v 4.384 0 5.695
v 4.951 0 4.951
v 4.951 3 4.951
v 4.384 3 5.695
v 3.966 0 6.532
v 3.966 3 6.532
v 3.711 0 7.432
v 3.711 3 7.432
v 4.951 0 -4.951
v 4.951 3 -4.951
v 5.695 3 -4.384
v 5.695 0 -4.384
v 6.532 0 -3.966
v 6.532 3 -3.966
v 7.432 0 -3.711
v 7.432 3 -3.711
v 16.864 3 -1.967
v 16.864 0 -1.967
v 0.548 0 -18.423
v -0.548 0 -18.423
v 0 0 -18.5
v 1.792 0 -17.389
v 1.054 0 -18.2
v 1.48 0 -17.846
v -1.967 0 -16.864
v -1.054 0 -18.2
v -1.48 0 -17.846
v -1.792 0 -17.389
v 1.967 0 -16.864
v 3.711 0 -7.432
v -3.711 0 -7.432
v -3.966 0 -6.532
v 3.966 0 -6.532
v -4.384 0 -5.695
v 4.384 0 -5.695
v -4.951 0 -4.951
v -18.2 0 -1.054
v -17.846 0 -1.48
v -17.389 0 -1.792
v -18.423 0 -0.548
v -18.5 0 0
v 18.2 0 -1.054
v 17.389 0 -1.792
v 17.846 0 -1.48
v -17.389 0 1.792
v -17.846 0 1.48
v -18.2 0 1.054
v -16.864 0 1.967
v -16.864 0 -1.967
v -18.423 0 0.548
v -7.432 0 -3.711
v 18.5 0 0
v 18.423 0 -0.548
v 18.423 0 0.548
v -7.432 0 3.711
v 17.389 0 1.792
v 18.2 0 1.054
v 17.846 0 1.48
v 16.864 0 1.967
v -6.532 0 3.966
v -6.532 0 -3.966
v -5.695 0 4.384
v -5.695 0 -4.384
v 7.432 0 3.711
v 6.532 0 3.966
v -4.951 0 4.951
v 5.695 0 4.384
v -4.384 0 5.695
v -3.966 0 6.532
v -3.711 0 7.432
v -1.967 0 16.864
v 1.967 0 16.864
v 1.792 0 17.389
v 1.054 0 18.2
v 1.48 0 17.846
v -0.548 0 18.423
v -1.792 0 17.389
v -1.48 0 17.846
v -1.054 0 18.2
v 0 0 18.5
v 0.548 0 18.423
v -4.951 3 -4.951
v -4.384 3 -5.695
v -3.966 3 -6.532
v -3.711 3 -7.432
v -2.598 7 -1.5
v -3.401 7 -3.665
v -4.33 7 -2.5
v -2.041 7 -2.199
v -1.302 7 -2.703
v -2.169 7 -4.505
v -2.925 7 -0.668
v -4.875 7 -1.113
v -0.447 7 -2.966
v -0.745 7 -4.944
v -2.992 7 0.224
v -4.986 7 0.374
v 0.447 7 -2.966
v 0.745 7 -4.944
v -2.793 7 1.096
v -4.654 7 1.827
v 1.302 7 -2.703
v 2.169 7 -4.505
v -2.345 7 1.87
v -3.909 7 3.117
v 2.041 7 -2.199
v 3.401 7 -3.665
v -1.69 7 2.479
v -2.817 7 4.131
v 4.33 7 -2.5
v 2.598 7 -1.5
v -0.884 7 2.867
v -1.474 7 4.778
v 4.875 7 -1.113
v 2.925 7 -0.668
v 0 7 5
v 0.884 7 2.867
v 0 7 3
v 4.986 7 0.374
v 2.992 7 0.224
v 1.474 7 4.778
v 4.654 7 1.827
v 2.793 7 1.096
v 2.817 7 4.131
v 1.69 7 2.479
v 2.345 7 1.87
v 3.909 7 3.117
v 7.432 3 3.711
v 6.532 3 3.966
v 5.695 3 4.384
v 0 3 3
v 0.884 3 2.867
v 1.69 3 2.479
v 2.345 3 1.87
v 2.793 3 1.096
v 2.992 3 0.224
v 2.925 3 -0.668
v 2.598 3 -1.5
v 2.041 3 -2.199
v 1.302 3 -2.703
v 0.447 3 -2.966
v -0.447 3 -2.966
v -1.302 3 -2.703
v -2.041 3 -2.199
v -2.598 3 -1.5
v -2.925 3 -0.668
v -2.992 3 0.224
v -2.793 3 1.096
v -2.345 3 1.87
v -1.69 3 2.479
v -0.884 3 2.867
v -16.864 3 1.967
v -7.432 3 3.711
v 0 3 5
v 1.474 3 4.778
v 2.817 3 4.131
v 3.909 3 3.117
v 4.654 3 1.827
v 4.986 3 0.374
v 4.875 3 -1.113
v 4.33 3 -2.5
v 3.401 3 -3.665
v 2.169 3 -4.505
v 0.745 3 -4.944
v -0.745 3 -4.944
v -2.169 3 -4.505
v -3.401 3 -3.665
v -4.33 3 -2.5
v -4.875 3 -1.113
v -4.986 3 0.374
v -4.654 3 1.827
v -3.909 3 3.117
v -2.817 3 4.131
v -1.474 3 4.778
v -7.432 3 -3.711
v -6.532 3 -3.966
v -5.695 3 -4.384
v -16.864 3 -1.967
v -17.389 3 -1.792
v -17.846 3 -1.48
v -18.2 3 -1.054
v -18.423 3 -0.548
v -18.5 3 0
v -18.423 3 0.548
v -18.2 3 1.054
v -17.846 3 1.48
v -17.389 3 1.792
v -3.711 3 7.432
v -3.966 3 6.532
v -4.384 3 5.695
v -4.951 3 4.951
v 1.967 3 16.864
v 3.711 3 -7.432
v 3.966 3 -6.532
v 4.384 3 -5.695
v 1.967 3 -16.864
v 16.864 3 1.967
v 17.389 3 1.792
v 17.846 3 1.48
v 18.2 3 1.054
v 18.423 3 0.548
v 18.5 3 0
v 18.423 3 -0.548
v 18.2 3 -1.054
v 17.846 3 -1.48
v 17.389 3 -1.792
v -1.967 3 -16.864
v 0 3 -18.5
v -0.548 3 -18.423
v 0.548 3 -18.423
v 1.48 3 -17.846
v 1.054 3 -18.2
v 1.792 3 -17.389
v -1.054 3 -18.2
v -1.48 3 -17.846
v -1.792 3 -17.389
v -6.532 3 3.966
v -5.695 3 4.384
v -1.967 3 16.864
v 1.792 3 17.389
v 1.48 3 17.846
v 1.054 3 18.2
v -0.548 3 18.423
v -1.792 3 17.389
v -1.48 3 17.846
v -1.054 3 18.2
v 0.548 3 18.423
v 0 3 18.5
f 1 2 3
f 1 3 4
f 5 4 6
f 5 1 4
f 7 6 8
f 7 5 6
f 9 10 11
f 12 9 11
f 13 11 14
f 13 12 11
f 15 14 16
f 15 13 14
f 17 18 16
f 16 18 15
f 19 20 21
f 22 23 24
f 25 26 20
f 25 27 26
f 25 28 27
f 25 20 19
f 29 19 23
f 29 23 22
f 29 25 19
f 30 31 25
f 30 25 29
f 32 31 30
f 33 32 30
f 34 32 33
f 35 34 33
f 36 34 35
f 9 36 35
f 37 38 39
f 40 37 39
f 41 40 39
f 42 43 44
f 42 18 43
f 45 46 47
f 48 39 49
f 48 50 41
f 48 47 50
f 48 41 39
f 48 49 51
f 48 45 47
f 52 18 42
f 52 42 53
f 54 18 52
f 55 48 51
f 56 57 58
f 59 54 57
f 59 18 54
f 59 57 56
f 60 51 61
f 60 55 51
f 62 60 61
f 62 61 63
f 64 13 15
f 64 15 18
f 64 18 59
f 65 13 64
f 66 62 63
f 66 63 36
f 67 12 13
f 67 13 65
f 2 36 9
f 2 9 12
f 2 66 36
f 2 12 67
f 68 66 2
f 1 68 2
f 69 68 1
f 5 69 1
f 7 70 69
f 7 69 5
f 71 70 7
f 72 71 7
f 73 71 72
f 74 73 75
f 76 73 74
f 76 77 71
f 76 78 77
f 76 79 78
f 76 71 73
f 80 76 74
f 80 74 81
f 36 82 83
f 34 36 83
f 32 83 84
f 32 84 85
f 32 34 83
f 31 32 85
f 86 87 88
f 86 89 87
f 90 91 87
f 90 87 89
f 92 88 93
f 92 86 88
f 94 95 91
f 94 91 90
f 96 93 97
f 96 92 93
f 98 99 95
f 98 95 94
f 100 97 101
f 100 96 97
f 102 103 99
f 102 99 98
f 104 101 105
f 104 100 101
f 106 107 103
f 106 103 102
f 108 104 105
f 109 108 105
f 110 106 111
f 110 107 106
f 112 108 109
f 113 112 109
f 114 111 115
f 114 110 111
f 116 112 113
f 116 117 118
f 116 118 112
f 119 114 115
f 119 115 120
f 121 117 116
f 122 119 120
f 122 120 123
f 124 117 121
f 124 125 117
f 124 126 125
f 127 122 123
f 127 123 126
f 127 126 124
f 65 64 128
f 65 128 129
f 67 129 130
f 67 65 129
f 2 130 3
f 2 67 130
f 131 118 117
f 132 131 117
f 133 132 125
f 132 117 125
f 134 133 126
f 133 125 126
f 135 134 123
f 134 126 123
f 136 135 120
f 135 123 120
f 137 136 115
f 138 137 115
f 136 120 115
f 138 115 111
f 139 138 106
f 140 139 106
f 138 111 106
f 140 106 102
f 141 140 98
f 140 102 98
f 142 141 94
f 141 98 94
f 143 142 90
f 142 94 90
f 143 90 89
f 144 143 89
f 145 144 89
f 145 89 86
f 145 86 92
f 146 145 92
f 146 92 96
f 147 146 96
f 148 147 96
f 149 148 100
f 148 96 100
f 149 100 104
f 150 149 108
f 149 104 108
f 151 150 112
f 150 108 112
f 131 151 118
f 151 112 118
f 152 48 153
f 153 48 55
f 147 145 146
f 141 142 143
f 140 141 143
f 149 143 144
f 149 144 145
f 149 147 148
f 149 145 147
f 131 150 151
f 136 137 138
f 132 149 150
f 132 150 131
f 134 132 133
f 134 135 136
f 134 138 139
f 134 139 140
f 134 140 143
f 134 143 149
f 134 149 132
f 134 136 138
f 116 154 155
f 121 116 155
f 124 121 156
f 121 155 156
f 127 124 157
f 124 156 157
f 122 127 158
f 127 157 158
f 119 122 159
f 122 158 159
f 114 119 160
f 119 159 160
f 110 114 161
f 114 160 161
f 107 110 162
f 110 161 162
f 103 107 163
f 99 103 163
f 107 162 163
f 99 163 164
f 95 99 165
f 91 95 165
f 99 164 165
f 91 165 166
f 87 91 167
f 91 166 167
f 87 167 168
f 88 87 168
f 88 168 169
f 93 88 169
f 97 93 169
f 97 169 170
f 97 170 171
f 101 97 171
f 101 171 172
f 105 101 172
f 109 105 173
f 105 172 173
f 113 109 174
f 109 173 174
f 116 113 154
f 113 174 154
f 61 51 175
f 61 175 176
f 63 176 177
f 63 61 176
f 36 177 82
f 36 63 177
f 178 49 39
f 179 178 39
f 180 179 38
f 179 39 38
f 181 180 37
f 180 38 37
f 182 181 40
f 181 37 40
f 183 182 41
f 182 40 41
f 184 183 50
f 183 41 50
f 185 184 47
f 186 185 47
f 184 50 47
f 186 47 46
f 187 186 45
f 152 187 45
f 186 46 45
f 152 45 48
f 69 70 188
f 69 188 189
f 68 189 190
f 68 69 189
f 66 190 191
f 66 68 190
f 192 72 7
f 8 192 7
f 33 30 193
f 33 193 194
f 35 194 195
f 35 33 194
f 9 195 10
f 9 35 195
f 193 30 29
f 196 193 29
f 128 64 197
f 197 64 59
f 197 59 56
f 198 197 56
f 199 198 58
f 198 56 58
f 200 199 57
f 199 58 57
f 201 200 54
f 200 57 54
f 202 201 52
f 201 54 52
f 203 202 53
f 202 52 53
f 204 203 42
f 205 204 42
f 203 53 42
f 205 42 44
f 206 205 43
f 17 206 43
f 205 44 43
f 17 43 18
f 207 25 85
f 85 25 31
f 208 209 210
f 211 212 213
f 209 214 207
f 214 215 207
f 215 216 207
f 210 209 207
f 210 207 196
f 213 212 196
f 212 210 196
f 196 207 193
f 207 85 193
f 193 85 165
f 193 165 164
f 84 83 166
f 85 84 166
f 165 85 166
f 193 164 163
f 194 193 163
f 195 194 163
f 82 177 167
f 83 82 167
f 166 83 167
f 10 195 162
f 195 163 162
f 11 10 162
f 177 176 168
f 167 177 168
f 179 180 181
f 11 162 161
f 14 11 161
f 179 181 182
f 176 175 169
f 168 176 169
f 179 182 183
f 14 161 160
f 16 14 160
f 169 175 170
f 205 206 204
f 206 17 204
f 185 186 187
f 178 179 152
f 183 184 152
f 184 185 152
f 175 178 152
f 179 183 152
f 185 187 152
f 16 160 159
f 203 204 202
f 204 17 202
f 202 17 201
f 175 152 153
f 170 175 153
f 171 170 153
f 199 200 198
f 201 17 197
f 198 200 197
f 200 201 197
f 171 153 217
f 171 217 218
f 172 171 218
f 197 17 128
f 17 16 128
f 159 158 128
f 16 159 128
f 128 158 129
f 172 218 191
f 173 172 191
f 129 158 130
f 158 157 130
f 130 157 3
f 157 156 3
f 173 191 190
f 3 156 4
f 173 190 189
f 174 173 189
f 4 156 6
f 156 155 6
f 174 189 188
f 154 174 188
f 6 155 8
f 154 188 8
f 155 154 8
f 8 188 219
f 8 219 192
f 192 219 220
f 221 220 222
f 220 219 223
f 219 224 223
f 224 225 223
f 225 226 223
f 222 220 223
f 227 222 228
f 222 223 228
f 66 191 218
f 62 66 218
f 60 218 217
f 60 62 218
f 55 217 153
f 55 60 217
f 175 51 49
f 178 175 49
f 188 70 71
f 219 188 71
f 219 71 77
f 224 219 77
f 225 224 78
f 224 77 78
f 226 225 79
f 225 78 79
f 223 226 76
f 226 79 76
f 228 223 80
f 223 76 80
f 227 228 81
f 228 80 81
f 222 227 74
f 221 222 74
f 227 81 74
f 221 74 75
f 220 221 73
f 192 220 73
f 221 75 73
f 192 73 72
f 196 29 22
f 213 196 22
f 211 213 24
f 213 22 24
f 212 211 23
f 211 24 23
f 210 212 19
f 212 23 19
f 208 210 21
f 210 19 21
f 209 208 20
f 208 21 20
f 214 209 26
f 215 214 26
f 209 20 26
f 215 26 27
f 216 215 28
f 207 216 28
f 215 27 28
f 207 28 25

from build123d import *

# Parameters (mm, degrees)
BOSS_EXTRUDE1_DEPTH = 3
SKETCH2_R           = 5
BOSS_EXTRUDE2_DEPTH = 4
SKETCH3_R           = 3
CUT_EXTRUDE1_DEPTH  = 4
FILLET1_R           = 5


with BuildPart() as part:
    # Sketch1 → Boss-Extrude1 (new body)
    with BuildSketch(Plane(origin=(0, 0, 0), x_dir=(1, 0, 0), z_dir=(0, 1, 0))):
        with BuildLine():
            Line((-1.966664332, 16.863636364), (-4.025937287, 5.726415018))
            ThreePointArc((-4.025937287, 5.726415018), (-4.949747468, 4.949747468), (-5.726415018, 4.025937287))
            Line((-5.726415018, 4.025937287), (-16.863636364, 1.966664332))
            ThreePointArc((-16.863636364, 1.966664332), (-18.5, 0), (-16.863636364, -1.966664332))
            Line((-16.863636364, -1.966664332), (-5.726415018, -4.025937287))
            ThreePointArc((-5.726415018, -4.025937287), (-4.949747468, -4.949747468), (-4.025937287, -5.726415018))
            Line((-4.025937287, -5.726415018), (-1.966664332, -16.863636364))
            ThreePointArc((-1.966664332, -16.863636364), (0, -18.5), (1.966664332, -16.863636364))
            Line((1.966664332, -16.863636364), (4.025937287, -5.726415018))
            ThreePointArc((4.025937287, -5.726415018), (4.949747468, -4.949747468), (5.726415018, -4.025937287))
            Line((5.726415018, -4.025937287), (16.863636364, -1.966664332))
            ThreePointArc((16.863636364, -1.966664332), (18.5, 0), (16.863636364, 1.966664332))
            Line((16.863636364, 1.966664332), (5.726415018, 4.025937287))
            ThreePointArc((5.726415018, 4.025937287), (4.949747468, 4.949747468), (4.025937287, 5.726415018))
            Line((4.025937287, 5.726415018), (1.966664332, 16.863636364))
            ThreePointArc((1.966664332, 16.863636364), (0, 18.5), (-1.966664332, 16.863636364))
        make_face()
    extrude(amount=BOSS_EXTRUDE1_DEPTH)

    # Sketch2 → Boss-Extrude2 (add)
    with BuildSketch(Plane(origin=(0, 3, 0), x_dir=(1, 0, 0), z_dir=(0, 1, 0))):
        with Locations(Location((0, 0, 0), (0, 0, 270))):
            Circle(SKETCH2_R)
    extrude(amount=BOSS_EXTRUDE2_DEPTH)

    # Sketch3 → Cut-Extrude1 (cut)
    with BuildSketch(Plane(origin=(0, 7, 0), x_dir=(1, 0, 0), z_dir=(0, 1, 0))):
        with Locations(Location((0, 0, 0), (0, 0, 270))):
            Circle(SKETCH3_R)
    extrude(amount=-CUT_EXTRUDE1_DEPTH, mode=Mode.SUBTRACT)

    # Fillet1
    # the kernel refuses this fillet: 5 mm, written as the material it adds along each edge
    with BuildSketch(Plane(origin=(5.726415018, 0, 4.025937287), x_dir=(0.983332166035634, 0, -0.18181818181817894), z_dir=(0, 1, 0))) as fillet1_piece_1:
        with BuildLine():
            CenterArc((1.734270095, -5), FILLET1_R, 90, 33.557309762)
            ThreePointArc((-1.029583897, -0.833333333), (-0.495036767, -0.441074207), (0, 0))
            Line((0, 0), (1.734270095, 0))
        make_face()
    extrude(amount=3)
    with BuildSketch(Plane(origin=(4.025937287, 0, 5.726415018), x_dir=(0.7599749646341246, 0, -0.6499523468142576), z_dir=(0, 1, 0))) as fillet1_piece_2:
        with BuildLine():
            CenterArc((1.797631616, -4.977571028), FILLET1_R, 95.428999418, 33.557309762)
            Line((-1.348041755, -1.091089451), (0, 0))
            ThreePointArc((0, 0), (0.662285332, -0.031400561), (1.324570664, 0))
        make_face()
    extrude(amount=3)
    with BuildSketch(Plane(origin=(-4.025937287, 0, 5.726415018), x_dir=(-0.7599749646342022, 0, -0.6499523468141668), z_dir=(0, 1, 0)), Plane(origin=(-5.726415018, 0, -4.025937287), x_dir=(0.6499523468141845, 0, -0.7599749646341871), z_dir=(0, 1, 0)), Plane(origin=(4.025937287, 0, -5.726415018), x_dir=(0.7599749646341224, 0, 0.6499523468142602), z_dir=(0, 1, 0))) as fillet1_piece_3:
        with BuildLine():
            CenterArc((1.797631616, 4.977571028), FILLET1_R, 231.01369082, 33.557309762)
            Line((-1.348041755, 1.091089451), (0, 0))
            ThreePointArc((0, 0), (0.662285332, 0.031400561), (1.324570664, 0))
        make_face()
    extrude(amount=3)
    with BuildSketch(Plane(origin=(-5.726415018, 0, 4.025937287), x_dir=(-0.9833321660356334, 0, -0.18181818181818182), z_dir=(0, 1, 0)), Plane(origin=(-4.025937287, 0, -5.726415018), x_dir=(0.1818181818181817, 0, -0.9833321660356334), z_dir=(0, 1, 0)), Plane(origin=(5.726415018, 0, -4.025937287), x_dir=(0.9833321660356329, 0, 0.1818181818181846), z_dir=(0, 1, 0))) as fillet1_piece_4:
        with BuildLine():
            CenterArc((1.734270095, 5), FILLET1_R, 236.442690238, 33.557309762)
            ThreePointArc((-1.029583897, 0.833333333), (-0.495036767, 0.441074207), (0, 0))
            Line((0, 0), (1.734270095, 0))
        make_face()
    extrude(amount=3)


solid = part.part
